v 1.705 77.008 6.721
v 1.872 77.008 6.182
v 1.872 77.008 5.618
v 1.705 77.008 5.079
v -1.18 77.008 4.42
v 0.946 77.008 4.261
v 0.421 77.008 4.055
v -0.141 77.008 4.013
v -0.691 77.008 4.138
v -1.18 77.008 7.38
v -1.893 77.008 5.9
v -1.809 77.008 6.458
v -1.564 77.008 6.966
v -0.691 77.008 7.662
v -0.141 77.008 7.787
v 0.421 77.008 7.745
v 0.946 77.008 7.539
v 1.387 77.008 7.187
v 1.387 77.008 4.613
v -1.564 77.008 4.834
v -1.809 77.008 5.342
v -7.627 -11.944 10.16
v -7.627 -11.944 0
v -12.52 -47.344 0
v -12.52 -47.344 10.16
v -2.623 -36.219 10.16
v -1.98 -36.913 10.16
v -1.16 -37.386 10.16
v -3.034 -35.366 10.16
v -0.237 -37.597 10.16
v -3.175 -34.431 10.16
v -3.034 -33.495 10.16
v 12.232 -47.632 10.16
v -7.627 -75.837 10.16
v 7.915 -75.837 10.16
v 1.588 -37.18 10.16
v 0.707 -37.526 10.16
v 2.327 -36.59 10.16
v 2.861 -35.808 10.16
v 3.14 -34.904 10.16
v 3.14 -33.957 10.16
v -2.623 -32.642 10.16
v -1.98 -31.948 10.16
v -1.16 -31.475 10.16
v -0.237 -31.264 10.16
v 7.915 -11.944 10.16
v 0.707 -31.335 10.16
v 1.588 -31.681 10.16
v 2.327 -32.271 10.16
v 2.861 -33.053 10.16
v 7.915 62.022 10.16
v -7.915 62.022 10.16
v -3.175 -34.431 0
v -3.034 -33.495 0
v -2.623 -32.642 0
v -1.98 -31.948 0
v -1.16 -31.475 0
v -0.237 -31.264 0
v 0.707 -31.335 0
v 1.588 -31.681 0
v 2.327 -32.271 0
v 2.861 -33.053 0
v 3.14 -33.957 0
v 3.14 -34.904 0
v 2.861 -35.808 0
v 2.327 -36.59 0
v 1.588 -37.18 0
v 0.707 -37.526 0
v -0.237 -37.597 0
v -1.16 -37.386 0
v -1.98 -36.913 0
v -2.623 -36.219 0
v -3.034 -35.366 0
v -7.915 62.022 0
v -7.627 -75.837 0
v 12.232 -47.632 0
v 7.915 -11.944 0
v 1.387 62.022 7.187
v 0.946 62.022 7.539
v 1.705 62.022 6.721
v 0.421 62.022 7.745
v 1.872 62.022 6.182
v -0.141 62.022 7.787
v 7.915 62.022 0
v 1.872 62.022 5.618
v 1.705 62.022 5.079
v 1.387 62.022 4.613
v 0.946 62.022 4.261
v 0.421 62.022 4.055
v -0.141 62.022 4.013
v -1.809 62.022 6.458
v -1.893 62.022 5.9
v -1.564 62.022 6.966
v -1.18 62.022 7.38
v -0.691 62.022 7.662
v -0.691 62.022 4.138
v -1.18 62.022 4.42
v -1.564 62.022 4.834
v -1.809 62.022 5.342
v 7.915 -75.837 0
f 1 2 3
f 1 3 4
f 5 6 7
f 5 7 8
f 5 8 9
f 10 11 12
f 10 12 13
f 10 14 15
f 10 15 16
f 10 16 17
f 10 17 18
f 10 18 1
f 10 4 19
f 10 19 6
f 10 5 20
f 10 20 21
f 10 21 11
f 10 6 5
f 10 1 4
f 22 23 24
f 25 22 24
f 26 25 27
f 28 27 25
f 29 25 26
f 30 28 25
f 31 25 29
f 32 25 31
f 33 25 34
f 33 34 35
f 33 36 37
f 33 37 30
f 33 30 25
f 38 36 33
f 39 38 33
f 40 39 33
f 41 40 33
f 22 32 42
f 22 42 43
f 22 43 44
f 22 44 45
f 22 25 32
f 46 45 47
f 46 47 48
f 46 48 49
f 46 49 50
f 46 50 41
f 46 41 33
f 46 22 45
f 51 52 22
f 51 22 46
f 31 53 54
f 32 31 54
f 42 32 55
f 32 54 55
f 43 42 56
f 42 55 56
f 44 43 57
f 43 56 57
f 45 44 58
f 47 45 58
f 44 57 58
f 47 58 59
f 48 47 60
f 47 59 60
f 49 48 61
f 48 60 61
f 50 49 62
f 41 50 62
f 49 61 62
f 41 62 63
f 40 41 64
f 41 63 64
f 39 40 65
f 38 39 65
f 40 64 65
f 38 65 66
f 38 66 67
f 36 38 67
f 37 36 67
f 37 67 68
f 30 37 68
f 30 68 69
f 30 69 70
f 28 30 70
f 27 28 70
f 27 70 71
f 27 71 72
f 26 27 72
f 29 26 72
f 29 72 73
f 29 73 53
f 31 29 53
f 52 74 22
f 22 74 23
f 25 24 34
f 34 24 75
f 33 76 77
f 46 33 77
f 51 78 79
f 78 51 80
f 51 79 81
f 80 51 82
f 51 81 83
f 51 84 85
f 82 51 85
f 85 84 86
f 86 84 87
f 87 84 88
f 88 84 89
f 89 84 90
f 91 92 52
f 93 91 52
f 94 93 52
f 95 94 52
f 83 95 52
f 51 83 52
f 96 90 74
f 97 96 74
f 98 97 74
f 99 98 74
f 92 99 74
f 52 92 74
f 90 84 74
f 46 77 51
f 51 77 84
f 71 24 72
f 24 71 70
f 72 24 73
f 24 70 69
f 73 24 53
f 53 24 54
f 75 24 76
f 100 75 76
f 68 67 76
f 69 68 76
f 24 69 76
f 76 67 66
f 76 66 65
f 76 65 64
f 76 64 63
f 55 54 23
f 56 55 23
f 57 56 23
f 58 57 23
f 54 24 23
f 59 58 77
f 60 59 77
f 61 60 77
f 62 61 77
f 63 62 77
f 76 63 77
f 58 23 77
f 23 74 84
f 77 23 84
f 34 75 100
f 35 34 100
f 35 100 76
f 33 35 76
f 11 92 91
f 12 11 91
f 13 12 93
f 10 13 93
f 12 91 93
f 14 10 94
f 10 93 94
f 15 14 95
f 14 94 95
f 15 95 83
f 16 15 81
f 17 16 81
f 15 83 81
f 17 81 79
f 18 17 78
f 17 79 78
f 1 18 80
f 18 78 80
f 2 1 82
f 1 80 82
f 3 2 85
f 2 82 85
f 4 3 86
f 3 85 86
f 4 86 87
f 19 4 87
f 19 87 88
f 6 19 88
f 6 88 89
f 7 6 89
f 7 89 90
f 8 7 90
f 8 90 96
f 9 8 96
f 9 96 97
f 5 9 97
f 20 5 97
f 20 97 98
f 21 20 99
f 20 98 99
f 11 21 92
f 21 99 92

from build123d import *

# Parameters (mm, degrees)
F1_DEPTH = 10.16
F2_R     = 1.892747
F3_DEPTH = 14.986
F5_D     = 6.35


with BuildPart() as f1:
    # F0 (on Top) → F1 (new body)
    with BuildSketch(Plane.XY):
        Polygon((7.914659, 62.022142), (-7.914659, 62.022142), (-7.626853, -11.943939), (-12.51955, -47.344048), (-7.626853, -75.836815), (7.914659, -75.836815), (12.231744, -47.631852), (7.914659, -11.943939), align=None)
    extrude(amount=F1_DEPTH)

    # F2 (on face) → F3 (join)
    with BuildSketch(Plane(origin=(0, 62.022142, 0), x_dir=(-1, 0, 0), z_dir=(0, 1, 0))):
        with Locations((0, 5.900018)):
            Circle(F2_R)
    extrude(amount=F3_DEPTH)

    # F5 (through all)
    with Locations(Plane.XY.offset(10.16)):
        with Locations((0, -34.430573)):
            Hole(F5_D / 2)


solid = f1.part
